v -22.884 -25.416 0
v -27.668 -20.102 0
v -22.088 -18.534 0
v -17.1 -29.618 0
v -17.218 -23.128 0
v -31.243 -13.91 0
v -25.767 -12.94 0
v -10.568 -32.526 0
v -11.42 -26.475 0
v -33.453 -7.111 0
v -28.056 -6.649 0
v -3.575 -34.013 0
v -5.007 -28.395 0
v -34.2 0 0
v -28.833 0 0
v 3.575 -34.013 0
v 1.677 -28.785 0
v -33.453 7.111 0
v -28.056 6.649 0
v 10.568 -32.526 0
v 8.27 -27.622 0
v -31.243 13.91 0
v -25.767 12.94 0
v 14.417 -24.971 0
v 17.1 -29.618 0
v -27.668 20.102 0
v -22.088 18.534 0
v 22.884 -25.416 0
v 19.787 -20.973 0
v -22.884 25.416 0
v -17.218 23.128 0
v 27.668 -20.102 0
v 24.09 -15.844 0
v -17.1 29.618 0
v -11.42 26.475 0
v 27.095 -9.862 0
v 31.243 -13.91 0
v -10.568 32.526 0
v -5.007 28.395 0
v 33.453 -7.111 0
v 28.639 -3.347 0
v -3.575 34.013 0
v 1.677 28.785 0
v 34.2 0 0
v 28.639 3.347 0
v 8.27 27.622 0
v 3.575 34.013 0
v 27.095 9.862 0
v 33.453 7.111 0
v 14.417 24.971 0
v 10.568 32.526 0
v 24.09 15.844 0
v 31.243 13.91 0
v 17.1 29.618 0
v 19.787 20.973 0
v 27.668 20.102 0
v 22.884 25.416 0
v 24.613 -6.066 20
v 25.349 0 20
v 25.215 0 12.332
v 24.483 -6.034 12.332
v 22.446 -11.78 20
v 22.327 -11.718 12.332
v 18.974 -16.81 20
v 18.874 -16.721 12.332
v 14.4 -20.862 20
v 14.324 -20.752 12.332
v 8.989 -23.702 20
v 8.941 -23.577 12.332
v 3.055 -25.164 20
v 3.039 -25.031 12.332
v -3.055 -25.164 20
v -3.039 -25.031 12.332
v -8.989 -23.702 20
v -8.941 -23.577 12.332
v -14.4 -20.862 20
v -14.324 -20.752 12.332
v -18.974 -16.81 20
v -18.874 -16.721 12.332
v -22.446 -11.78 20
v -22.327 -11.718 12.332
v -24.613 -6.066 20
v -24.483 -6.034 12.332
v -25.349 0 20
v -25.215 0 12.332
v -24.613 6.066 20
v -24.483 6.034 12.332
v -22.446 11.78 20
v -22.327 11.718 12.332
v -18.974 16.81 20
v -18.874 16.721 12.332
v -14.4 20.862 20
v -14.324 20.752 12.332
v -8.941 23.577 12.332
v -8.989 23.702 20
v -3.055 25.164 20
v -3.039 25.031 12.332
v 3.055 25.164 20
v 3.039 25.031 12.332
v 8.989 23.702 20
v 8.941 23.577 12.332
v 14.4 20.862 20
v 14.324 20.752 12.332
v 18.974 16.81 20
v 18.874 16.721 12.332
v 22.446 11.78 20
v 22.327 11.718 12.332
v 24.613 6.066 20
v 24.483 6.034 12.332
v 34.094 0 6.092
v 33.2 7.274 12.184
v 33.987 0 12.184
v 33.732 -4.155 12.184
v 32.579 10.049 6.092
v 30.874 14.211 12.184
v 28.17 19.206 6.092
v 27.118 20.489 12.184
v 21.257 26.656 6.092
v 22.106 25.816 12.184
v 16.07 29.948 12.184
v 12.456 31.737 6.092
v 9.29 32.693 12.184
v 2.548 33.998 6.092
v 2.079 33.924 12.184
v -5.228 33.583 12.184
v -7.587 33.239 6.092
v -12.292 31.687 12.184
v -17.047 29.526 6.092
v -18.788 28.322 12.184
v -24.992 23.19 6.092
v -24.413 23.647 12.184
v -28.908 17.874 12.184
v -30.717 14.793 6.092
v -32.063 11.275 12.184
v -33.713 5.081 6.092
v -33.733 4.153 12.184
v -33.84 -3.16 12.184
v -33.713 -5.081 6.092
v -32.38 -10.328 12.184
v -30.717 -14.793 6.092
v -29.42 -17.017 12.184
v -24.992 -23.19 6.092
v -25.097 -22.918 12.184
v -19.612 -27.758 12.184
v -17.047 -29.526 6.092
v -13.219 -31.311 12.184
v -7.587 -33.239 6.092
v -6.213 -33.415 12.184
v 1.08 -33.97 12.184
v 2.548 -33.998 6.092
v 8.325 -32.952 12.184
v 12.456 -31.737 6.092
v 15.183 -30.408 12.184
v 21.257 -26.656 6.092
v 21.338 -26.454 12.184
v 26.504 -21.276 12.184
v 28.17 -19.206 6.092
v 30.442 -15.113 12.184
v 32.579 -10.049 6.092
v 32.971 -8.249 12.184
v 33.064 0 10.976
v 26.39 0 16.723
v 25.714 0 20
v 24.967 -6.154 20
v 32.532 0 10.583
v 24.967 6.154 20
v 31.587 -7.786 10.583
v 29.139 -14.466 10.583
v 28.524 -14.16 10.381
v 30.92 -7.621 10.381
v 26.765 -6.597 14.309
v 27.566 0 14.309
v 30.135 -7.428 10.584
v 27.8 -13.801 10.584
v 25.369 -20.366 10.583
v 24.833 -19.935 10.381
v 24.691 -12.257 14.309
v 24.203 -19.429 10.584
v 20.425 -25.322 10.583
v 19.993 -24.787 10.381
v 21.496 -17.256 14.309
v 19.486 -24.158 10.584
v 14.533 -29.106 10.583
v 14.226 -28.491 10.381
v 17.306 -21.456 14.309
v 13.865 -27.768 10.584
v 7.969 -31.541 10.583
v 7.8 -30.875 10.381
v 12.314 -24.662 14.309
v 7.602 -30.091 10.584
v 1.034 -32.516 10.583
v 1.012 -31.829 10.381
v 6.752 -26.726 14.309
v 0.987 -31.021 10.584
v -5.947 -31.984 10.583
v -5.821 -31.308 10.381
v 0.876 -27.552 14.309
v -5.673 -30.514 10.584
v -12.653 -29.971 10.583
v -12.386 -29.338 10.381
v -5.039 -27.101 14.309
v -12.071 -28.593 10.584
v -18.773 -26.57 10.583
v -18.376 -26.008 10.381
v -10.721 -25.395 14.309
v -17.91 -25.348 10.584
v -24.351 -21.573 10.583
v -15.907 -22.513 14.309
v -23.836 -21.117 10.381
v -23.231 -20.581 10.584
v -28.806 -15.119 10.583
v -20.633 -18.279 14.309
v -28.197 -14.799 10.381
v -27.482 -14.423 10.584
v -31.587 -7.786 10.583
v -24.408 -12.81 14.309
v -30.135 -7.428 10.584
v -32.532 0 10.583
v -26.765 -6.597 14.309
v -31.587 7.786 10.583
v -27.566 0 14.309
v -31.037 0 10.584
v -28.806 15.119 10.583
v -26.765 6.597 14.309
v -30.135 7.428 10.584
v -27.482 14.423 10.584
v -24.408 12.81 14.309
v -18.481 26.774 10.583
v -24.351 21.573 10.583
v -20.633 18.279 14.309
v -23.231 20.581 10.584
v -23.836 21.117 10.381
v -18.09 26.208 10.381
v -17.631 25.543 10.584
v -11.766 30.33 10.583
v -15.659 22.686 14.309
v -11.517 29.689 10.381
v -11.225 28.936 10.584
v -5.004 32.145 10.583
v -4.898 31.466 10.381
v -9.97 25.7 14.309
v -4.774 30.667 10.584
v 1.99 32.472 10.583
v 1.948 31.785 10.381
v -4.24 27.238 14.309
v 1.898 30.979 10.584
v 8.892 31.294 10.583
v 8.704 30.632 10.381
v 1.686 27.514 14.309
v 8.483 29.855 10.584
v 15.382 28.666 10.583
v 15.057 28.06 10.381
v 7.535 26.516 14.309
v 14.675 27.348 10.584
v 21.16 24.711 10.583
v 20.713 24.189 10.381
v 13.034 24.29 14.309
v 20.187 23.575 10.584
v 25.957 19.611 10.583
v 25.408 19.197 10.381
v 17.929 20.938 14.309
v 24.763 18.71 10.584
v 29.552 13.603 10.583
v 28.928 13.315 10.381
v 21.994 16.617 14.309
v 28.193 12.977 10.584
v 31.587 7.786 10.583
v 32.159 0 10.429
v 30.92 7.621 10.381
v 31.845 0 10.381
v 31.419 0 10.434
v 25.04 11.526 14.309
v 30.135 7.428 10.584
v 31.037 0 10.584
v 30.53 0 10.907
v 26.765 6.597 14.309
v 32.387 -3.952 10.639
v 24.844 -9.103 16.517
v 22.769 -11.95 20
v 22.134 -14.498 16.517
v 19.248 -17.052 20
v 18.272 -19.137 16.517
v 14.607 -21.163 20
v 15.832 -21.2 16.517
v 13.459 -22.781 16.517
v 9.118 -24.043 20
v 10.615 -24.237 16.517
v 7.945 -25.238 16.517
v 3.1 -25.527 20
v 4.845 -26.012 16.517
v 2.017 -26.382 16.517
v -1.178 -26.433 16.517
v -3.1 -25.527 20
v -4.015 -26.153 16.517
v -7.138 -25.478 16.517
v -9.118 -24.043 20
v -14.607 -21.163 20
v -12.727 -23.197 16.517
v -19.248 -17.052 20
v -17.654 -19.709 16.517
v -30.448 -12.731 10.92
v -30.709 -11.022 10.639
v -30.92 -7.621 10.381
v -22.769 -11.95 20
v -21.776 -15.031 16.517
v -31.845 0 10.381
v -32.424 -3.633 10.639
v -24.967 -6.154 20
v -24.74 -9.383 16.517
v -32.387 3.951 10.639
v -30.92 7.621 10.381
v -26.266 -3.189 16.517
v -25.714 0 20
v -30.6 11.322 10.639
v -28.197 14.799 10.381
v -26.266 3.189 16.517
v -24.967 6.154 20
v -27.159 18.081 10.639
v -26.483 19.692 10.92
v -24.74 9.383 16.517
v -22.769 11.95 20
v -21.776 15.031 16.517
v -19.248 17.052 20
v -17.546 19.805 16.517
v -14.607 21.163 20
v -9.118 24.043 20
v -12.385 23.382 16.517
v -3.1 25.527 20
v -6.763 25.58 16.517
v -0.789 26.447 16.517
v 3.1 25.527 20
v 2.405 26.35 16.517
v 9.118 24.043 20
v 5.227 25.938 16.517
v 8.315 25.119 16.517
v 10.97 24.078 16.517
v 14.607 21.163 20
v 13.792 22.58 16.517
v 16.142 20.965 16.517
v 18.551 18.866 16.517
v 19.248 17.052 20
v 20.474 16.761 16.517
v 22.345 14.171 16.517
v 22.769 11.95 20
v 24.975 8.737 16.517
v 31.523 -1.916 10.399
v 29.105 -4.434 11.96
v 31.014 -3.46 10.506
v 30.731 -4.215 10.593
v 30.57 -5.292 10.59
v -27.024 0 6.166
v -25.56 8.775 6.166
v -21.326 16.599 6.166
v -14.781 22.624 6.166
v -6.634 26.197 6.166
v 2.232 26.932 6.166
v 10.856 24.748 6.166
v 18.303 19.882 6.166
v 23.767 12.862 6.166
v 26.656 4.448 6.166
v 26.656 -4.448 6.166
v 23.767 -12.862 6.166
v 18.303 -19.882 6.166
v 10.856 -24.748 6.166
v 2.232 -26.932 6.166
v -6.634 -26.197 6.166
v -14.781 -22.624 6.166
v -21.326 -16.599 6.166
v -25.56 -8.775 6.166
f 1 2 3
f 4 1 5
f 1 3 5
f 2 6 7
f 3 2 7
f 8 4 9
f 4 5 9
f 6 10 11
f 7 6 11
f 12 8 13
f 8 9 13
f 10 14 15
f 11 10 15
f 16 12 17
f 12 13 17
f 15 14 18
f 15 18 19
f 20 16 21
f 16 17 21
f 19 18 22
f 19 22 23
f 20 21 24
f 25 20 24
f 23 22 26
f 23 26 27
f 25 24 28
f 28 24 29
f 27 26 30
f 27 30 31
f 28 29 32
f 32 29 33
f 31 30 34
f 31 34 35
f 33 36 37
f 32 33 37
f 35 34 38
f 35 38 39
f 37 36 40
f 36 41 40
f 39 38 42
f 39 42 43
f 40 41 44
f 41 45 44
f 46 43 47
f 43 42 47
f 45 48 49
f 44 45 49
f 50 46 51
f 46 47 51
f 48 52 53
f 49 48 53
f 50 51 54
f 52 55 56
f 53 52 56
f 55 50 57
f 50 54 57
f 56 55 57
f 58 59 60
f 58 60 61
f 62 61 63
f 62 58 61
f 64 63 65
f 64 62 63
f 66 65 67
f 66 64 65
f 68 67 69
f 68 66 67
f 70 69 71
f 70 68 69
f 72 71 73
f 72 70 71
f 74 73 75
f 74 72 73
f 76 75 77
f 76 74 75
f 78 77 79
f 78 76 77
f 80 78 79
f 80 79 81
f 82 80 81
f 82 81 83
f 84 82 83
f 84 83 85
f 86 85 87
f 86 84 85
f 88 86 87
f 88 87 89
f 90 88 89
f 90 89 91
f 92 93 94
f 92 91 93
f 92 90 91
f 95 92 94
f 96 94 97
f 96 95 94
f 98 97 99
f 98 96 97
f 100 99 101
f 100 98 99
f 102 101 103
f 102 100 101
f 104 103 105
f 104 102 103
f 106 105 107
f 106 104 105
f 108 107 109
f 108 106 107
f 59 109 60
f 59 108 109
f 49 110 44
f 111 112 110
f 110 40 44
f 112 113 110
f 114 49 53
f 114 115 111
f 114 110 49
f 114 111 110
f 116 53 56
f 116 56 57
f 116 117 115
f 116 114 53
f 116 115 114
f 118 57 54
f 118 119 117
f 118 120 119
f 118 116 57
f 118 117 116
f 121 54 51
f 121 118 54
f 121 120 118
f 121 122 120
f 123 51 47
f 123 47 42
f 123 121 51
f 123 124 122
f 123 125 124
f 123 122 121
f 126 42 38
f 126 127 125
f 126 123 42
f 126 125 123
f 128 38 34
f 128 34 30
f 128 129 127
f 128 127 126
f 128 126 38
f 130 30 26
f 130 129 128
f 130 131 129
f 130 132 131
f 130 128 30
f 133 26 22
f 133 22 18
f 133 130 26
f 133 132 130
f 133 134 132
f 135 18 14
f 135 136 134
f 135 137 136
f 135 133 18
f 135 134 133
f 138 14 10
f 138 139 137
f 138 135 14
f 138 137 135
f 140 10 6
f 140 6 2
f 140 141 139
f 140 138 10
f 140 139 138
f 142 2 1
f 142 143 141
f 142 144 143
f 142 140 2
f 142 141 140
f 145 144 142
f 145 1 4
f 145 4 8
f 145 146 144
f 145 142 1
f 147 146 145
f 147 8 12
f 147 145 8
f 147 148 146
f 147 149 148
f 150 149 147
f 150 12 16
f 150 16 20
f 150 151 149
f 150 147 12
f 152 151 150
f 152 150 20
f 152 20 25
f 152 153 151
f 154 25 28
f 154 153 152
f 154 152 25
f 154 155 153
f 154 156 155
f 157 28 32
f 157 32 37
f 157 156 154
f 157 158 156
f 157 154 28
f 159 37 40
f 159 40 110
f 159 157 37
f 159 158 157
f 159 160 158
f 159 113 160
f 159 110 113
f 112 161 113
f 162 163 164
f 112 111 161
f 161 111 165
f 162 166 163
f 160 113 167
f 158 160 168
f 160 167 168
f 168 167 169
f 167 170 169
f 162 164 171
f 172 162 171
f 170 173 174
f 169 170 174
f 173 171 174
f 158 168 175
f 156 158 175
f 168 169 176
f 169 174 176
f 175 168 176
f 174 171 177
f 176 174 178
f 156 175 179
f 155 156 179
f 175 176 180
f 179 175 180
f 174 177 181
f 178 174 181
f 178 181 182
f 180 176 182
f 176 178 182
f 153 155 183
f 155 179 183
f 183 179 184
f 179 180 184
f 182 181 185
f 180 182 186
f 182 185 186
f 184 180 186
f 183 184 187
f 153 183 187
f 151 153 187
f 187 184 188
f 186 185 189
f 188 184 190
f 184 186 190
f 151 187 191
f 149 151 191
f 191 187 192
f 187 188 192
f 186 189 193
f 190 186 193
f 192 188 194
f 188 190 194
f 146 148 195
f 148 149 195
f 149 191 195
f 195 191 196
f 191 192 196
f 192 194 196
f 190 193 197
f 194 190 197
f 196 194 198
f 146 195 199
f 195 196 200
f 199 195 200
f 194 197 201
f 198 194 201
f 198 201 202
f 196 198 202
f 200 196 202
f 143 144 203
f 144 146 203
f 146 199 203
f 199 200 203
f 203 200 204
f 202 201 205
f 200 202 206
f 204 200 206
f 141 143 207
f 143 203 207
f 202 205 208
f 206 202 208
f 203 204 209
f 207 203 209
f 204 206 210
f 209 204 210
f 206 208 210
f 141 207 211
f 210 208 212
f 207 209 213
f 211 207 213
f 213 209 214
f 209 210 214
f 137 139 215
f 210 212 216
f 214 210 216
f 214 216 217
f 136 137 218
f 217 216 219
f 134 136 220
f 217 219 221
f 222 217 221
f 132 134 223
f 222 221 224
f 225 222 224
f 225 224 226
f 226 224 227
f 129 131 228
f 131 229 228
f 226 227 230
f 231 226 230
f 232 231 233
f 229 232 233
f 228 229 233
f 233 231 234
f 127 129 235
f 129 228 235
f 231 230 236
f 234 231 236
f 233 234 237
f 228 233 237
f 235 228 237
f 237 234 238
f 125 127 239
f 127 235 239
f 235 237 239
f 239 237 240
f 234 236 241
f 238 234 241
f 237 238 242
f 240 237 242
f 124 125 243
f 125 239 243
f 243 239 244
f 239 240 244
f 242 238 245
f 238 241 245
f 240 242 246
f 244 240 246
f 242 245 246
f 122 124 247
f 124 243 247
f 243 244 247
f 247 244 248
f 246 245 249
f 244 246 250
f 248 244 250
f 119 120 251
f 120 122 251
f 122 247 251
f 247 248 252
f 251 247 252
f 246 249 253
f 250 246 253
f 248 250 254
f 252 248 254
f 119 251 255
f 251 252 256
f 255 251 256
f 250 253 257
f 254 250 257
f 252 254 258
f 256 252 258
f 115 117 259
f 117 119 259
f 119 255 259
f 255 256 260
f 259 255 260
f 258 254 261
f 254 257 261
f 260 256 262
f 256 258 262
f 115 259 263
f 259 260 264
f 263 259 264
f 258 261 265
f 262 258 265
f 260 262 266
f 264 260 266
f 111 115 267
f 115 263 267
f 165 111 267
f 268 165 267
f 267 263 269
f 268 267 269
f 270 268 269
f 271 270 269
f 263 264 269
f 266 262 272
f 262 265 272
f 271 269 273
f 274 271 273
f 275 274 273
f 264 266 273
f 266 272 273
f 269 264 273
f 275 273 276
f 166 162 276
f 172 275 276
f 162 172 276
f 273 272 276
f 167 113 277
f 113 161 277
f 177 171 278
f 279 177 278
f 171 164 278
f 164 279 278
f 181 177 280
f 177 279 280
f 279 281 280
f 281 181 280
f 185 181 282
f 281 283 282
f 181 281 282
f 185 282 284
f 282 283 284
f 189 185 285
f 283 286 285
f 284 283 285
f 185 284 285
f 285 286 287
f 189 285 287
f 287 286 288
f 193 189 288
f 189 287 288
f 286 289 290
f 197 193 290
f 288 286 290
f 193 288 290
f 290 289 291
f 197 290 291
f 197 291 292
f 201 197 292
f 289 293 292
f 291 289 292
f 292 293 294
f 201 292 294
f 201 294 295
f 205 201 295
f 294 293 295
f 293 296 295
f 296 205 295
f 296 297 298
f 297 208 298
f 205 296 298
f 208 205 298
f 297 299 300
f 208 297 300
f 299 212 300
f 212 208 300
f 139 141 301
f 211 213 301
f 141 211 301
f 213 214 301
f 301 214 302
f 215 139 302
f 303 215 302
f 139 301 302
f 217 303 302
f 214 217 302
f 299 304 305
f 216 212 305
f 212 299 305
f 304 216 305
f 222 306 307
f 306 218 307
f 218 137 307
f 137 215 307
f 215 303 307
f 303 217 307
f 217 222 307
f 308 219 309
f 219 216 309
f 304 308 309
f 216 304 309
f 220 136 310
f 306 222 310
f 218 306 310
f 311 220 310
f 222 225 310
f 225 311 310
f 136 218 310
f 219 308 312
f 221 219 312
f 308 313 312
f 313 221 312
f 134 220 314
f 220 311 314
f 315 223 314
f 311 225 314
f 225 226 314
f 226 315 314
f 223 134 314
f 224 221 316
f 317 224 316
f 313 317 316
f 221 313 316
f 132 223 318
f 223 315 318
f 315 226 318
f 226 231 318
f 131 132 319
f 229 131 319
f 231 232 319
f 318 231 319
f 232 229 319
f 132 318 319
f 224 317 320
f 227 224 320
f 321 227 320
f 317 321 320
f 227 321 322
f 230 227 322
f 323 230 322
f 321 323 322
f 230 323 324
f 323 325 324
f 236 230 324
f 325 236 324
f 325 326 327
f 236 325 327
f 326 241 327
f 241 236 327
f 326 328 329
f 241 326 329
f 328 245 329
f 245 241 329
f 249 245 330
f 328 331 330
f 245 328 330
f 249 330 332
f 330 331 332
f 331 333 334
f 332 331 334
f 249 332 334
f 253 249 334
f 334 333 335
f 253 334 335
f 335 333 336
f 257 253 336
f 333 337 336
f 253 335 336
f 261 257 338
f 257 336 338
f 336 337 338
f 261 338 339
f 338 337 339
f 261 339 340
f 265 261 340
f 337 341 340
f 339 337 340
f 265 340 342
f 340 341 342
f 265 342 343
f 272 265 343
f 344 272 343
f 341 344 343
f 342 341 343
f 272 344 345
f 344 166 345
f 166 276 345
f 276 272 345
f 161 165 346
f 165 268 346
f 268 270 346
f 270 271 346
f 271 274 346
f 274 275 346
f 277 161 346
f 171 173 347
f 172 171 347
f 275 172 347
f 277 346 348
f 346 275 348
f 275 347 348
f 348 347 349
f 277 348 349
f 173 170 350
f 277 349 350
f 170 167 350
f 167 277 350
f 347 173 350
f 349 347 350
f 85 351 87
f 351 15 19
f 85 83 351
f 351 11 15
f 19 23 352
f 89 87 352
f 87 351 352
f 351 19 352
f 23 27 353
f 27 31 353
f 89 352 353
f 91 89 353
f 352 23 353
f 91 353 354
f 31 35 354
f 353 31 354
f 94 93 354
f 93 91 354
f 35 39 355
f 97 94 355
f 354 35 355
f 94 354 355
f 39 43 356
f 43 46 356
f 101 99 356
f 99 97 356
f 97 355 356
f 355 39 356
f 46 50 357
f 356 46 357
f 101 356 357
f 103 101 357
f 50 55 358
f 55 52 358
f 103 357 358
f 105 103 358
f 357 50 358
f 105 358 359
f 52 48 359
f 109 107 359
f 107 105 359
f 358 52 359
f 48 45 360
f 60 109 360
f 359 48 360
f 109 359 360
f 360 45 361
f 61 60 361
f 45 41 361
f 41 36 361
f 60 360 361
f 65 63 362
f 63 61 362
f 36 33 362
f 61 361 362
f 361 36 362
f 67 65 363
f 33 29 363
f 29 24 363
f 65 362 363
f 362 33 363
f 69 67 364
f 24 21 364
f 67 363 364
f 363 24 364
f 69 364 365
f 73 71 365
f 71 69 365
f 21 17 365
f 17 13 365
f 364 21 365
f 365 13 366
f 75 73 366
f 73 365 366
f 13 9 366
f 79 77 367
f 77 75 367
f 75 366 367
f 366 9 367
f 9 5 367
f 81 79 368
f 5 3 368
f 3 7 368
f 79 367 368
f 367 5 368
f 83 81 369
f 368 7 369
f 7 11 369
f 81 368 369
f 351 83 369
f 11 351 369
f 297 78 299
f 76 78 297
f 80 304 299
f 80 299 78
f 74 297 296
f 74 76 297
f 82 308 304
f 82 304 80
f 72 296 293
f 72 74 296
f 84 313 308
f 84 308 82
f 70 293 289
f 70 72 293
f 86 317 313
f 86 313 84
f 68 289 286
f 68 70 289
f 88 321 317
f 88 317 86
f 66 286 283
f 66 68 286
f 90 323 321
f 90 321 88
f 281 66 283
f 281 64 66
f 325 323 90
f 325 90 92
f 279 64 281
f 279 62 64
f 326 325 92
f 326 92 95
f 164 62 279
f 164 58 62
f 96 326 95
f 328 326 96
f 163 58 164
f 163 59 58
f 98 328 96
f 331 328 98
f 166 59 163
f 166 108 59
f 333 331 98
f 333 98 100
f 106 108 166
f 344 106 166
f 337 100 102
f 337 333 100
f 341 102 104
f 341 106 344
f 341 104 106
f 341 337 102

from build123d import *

# Parameters (mm, degrees)
F0_R     = 34.2
F0_R_2   = 25
F1_DEPTH = 20
F1_TAPER = 1


with BuildPart() as f1:
    # F0 (on Top) → F1 (new body)
    with BuildSketch(Plane.XY):
        Circle(F0_R)
        Circle(F0_R_2, mode=Mode.SUBTRACT)
    extrude(amount=F1_DEPTH, taper=F1_TAPER)

    # F2 (on Front) → F3 (revolve, cut)
    with BuildSketch(Plane.XZ):
        with BuildLine():
            add(Edge.make_bspline(
                [(33.8508987014, 20), (34.5279154674, 17.1435580228), (35.6019225021, 14.3100054706), (31.9943513722, 8.8355799611), (28.0930977125, 13.5709649723), (26.2169436245, 15.879539299), (25.7144793868, 20)],
                knots=[0, 0, 0, 0, 0.2671985565, 0.4881994445, 0.7042905591, 1, 1, 1, 1], degree=3))
            Line((33.8508987014, 20), (25.7144793868, 20))
        make_face()
    revolve(axis=Axis((0, 0, 20), (0, 0, -1)), mode=Mode.SUBTRACT)

    # F4 (on Front) → F5 (revolve, cut)
    with BuildSketch(Plane.XZ):
        Polygon((-23.3645886183, 18.6395887285), (-28.8334805518, 0), (-18.9926475286, 0), align=None)
    revolve(axis=Axis((0, 0, 20), (0, 0, -1)), mode=Mode.SUBTRACT)


solid = f1.part
